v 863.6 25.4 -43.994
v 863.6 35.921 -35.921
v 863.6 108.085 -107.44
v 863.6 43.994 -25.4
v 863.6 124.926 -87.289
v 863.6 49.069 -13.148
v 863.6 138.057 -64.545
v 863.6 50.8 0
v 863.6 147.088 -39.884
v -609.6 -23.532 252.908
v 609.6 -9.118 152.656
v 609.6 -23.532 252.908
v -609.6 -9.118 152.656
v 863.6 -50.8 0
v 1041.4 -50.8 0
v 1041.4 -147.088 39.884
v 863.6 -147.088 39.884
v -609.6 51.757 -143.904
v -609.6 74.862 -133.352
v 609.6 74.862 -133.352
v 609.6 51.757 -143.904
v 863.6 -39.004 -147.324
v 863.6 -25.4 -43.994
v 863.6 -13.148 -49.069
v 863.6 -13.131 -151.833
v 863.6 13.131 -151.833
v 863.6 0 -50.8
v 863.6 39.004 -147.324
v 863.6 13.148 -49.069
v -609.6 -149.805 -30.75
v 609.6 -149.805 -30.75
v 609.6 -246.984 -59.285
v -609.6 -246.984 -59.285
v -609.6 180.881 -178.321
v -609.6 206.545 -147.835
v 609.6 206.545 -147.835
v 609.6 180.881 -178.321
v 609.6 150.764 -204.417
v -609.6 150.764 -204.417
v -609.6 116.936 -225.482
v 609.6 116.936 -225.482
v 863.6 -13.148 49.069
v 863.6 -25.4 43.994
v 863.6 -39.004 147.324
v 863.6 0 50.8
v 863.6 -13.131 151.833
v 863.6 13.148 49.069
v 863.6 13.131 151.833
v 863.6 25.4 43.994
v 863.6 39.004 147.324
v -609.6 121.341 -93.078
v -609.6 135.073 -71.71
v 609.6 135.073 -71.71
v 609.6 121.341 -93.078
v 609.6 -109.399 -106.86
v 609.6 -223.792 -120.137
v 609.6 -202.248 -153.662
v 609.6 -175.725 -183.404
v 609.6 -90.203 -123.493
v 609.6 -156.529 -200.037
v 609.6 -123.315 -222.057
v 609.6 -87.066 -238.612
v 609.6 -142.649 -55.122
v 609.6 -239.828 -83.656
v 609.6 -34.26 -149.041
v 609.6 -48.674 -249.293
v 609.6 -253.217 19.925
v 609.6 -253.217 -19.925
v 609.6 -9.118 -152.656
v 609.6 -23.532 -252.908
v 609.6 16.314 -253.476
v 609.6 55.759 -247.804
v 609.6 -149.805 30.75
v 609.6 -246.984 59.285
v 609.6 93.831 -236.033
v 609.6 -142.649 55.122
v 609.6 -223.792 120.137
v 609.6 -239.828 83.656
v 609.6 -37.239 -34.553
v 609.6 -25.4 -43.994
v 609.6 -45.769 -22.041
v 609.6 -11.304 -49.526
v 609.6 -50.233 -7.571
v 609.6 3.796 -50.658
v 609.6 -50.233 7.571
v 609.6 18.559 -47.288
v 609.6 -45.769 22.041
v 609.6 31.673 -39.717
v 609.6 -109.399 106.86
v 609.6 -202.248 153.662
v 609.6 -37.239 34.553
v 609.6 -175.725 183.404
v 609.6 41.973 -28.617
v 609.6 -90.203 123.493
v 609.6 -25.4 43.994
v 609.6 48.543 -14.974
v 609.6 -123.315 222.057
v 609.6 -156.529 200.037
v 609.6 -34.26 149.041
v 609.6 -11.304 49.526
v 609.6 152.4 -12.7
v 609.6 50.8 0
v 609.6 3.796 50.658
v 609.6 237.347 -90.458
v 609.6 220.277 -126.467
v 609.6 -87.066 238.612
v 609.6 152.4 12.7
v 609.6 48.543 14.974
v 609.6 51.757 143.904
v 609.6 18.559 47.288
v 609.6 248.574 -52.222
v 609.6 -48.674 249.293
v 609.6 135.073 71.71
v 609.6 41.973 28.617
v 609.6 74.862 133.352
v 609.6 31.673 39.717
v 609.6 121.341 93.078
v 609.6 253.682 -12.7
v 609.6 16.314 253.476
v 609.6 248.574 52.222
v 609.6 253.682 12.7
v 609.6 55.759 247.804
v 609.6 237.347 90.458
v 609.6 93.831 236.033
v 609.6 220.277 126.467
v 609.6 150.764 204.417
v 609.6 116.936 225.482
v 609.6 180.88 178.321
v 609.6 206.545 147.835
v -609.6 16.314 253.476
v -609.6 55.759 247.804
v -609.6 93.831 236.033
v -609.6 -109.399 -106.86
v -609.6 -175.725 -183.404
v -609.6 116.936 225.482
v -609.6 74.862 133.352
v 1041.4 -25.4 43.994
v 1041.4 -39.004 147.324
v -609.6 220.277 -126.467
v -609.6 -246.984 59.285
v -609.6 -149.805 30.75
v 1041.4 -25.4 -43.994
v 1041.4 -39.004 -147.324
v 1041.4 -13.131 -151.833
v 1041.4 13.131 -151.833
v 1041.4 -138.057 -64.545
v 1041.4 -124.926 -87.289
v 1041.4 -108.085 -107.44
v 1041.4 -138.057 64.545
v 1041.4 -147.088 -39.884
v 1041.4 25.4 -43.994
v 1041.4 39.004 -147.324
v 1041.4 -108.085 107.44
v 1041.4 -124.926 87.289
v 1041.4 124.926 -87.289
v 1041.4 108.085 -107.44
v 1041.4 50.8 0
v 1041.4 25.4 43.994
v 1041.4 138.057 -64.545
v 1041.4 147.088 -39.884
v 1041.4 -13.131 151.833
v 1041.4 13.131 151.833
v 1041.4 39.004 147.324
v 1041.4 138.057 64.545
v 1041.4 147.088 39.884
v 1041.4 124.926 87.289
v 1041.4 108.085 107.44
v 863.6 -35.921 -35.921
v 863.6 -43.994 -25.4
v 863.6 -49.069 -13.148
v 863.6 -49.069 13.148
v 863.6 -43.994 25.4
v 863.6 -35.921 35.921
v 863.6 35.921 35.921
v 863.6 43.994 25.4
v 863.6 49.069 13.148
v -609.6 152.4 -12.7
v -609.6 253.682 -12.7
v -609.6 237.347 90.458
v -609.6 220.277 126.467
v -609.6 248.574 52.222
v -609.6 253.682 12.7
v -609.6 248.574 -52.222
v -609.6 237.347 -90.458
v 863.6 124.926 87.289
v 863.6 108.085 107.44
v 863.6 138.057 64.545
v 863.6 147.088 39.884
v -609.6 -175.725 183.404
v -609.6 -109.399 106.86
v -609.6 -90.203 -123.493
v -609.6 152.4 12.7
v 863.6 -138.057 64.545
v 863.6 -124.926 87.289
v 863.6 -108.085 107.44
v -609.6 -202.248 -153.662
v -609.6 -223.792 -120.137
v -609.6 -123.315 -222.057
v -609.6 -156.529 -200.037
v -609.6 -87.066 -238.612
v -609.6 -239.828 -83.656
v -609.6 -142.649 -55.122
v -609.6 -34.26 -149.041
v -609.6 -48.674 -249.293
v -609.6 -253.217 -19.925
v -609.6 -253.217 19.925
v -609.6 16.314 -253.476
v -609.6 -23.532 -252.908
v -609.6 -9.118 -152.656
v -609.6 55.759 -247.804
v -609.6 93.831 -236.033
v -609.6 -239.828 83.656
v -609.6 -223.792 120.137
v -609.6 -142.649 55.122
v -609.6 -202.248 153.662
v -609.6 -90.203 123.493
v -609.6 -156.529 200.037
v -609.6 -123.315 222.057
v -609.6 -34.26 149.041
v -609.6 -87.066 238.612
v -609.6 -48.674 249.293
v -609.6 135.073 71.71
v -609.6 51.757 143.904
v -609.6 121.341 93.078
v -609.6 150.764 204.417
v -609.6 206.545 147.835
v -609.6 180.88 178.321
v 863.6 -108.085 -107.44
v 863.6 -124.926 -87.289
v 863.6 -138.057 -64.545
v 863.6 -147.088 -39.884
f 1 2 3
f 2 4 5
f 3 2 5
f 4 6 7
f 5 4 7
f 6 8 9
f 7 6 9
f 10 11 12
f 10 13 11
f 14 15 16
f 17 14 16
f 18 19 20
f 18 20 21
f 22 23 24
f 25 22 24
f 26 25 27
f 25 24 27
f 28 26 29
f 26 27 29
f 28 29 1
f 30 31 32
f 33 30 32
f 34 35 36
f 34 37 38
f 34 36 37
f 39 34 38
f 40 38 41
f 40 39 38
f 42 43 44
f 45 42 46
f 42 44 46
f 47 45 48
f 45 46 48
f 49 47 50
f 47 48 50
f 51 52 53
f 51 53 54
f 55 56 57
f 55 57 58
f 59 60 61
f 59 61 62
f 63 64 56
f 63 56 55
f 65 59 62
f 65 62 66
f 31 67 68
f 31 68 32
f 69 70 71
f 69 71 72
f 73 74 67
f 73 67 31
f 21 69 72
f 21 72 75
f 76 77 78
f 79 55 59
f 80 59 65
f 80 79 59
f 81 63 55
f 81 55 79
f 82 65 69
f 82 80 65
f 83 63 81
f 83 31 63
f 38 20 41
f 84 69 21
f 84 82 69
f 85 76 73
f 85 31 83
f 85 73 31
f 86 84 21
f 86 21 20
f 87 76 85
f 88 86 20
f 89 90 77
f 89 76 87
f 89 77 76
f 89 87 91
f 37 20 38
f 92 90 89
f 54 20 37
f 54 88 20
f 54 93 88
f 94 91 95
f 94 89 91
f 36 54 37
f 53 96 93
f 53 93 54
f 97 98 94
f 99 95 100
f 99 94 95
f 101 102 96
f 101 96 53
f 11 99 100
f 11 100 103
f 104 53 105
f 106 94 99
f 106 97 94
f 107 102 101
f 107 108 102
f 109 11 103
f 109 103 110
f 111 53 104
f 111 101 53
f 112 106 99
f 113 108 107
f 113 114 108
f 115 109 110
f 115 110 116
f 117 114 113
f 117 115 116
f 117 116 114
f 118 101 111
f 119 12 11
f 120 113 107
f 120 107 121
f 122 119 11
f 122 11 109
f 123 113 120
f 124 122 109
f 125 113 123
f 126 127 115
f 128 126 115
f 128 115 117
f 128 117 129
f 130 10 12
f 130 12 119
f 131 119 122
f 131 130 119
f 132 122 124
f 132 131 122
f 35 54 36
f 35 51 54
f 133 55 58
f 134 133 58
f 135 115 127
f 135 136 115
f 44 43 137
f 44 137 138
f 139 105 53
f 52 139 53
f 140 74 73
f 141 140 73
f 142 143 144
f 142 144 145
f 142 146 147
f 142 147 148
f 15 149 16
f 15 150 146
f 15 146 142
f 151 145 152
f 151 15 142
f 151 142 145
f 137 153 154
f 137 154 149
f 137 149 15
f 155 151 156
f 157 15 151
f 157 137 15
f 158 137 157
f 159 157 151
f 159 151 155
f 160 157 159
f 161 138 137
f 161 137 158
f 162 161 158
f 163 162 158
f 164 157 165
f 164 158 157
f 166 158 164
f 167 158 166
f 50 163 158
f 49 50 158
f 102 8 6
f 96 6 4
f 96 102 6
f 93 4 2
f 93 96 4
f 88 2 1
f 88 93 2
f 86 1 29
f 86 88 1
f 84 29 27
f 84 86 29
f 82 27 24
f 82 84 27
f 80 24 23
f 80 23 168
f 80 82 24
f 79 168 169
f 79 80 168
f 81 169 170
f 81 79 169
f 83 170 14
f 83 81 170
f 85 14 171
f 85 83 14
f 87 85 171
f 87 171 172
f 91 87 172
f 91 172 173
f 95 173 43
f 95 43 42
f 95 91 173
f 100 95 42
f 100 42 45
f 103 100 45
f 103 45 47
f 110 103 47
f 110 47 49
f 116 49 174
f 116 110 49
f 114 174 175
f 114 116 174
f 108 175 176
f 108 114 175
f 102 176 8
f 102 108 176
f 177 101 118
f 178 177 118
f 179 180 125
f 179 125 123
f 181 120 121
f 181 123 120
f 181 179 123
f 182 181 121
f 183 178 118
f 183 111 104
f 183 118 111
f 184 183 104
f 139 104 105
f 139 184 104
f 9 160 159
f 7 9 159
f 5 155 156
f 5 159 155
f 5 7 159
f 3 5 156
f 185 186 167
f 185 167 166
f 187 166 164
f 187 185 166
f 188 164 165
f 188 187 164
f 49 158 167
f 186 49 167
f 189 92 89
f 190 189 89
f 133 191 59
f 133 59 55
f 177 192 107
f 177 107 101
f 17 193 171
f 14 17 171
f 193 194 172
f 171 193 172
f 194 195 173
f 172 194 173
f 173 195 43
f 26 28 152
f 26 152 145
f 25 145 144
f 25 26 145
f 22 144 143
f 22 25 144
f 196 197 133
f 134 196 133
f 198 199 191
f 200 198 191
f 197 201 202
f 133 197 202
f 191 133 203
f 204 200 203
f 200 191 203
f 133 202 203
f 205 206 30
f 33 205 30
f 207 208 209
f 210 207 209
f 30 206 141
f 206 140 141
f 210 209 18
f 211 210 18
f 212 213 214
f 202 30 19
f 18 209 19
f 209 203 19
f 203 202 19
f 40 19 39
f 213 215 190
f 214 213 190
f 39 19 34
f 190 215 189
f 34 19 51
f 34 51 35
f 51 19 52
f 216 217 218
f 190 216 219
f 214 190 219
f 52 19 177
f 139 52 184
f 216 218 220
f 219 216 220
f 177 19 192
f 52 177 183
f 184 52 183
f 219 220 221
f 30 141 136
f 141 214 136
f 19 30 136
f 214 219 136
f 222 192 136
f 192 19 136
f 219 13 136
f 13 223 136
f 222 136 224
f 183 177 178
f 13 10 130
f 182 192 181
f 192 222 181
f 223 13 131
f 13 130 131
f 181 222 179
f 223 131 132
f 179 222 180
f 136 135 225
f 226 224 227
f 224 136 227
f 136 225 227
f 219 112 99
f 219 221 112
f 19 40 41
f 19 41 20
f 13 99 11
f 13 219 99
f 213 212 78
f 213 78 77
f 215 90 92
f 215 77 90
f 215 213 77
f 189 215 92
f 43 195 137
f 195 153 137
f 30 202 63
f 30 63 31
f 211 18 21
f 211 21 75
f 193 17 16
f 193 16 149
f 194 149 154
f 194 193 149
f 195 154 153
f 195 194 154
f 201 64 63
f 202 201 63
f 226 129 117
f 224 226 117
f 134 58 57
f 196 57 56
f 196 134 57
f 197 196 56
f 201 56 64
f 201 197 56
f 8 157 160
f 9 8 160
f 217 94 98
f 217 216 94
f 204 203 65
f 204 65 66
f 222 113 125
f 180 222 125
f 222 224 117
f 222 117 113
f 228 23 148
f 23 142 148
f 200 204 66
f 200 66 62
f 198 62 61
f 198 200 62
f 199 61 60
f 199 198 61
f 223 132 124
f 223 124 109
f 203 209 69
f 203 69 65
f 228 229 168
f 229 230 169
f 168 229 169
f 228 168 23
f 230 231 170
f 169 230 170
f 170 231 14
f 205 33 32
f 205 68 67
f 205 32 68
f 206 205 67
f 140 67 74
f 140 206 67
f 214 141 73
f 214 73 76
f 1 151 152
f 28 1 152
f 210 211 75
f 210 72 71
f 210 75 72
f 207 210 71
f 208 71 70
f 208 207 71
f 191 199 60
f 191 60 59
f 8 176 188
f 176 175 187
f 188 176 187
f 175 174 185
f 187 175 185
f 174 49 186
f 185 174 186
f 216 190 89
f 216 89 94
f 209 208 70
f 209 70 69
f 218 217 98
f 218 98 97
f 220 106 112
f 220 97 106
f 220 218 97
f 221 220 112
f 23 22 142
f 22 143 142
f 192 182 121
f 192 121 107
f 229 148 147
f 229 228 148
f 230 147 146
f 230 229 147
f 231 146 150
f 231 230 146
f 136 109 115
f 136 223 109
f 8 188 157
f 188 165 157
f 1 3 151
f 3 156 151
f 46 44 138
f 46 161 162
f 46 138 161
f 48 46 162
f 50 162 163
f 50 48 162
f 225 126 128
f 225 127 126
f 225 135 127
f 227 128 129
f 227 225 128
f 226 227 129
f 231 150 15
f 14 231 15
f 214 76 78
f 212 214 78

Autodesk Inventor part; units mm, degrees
ref_plane "YZ Plane" through (0, 0, 0) normal (1, 0, 0) x (0, 1, 0)
ref_plane "XZ Plane" through (0, 0, 0) normal (0, 1, 0) x (-1, 0, 0)
ref_plane "XY Plane" through (0, 0, 0) normal (0, 0, 1) x (1, 0, 0)
sketch "Sketch1" plane through (0, 0, 0) normal (1, 0, 0) x (0, 1, 0)
  line L0 (253.6823, 12.7) -> (152.4, 12.7)
  line L1 (152.4, 12.7) -> (152.4, -12.7)
  line L2 (152.4, -12.7) -> (253.6823, -12.7)
  line L3 (228.6, 0) -> (152.4, 0) construction
  line L4 (206.545, 147.8349) -> (121.3409, 93.0776)
  line L5 (121.3409, 93.0776) -> (135.0732, 71.7097)
  line L6 (135.0732, 71.7097) -> (220.2773, 126.4671)
  line L7 (93.8311, 236.0333) -> (51.7569, 143.9037)
  line L8 (51.7569, 143.9037) -> (74.8616, 133.3521)
  line L9 (74.8616, 133.3521) -> (116.9358, 225.4818)
  line L10 (-48.6735, 249.2928) -> (-34.2595, 149.0414)
  line L11 (-34.2595, 149.0414) -> (-9.118, 152.6562)
  line L12 (-9.118, 152.6562) -> (-23.532, 252.9076)
  line L13 (-175.7246, 183.4036) -> (-109.3988, 106.8595)
  line L14 (-109.3988, 106.8595) -> (-90.2028, 123.493)
  line L15 (-90.2028, 123.493) -> (-156.5286, 200.037)
  line L16 (-246.9844, 59.285) -> (-149.8047, 30.7505)
  line L17 (-149.8047, 30.7505) -> (-142.6487, 55.1216)
  line L18 (-142.6487, 55.1216) -> (-239.8284, 83.6561)
  line L19 (-239.8284, -83.6561) -> (-142.6487, -55.1216)
  line L20 (-142.6487, -55.1216) -> (-149.8047, -30.7505)
  line L21 (-149.8047, -30.7505) -> (-246.9844, -59.285)
  line L22 (-156.5286, -200.037) -> (-90.2028, -123.493)
  line L23 (-90.2028, -123.493) -> (-109.3988, -106.8595)
  line L24 (-109.3988, -106.8595) -> (-175.7246, -183.4036)
  line L25 (-23.532, -252.9076) -> (-9.118, -152.6562)
  line L26 (-9.118, -152.6562) -> (-34.2595, -149.0414)
  line L27 (-34.2595, -149.0414) -> (-48.6735, -249.2928)
  line L28 (116.9358, -225.4818) -> (74.8616, -133.3521)
  line L29 (74.8616, -133.3521) -> (51.7569, -143.9037)
  line L30 (51.7569, -143.9037) -> (93.8311, -236.0333)
  line L31 (220.2773, -126.4671) -> (135.0732, -71.7097)
  line L32 (135.0732, -71.7097) -> (121.3409, -93.0776)
  line L33 (121.3409, -93.0776) -> (206.545, -147.8349)
  arc A0 (253.6823, 12.7) -> (220.2773, 126.4671) centre (0, 0) ccw
  arc A1 (220.2773, -126.4671) -> (253.6823, -12.7) centre (0, 0) ccw
  arc A2 (116.9358, -225.4818) -> (206.545, -147.8349) centre (0, 0) ccw
  arc A3 (-23.532, -252.9076) -> (93.8311, -236.0333) centre (0, 0) ccw
  arc A4 (-156.5286, -200.037) -> (-48.6735, -249.2928) centre (0, 0) ccw
  arc A5 (-239.8284, -83.6561) -> (-175.7246, -183.4036) centre (0, 0) ccw
  arc A6 (-246.9844, 59.285) -> (-246.9844, -59.285) centre (0, 0) ccw
  arc A7 (-175.7246, 183.4036) -> (-239.8284, 83.6561) centre (0, 0) ccw
  arc A8 (-48.6735, 249.2928) -> (-156.5286, 200.037) centre (0, 0) ccw
  arc A9 (206.545, 147.8349) -> (116.9358, 225.4818) centre (0, 0) ccw
  arc A10 (93.8311, 236.0333) -> (-23.532, 252.9076) centre (0, 0) ccw
  point P0 (128.207, 82.3937)
  point P1 (63.3092, 138.6279)
  point P2 (-21.6888, 150.8488)
  point P3 (-99.8008, 115.1762)
  point P4 (-146.2267, 42.936)
  point P5 (-146.2267, -42.936)
  point P6 (-99.8008, -115.1762)
  point P7 (-21.6888, -150.8488)
  point P8 (63.3092, -138.6279)
  point P9 (128.207, -82.3937)
  dimension "d4" = 254
  dimension "d5" = 152.4
  dimension "d6" = 25.4
extrude "Extrusion1" add sketch "Sketch1" along normal mid plane 1219.2
sketch "Sketch2" plane through (0, 0, 0) normal (0, 0, 1) x (1, 0, 0)
  line L0 (609.6, 0) -> (1041.4, 0)
  line L1 (1041.4, 0) -> (1041.4, 152.4)
  line L2 (1041.4, 152.4) -> (863.6, 152.4)
  line L3 (863.6, 152.4) -> (863.6, 50.8)
  line L4 (863.6, 50.8) -> (609.6, 50.8)
  line L5 (609.6, -23.532) -> (609.6, 93.8311) projected
  point P0 (0, 0)
  dimension "d9" = 101.6
  dimension "d10" = 177.8
  dimension "d11" = 304.8
  dimension "d12" = 254
revolve "Revolution1" add sketch "Sketch2" angle 360 about axis through (609.6, 0, 0) along (1, 0, 0)
sketch "Sketch3" plane through (1041.4, 0, 0) normal (1, 0, 0) x (0, 0, -1)
  circle A0 centre (0, 0) radius 152.4 construction
  circle A1 centre (0, 0) radius 152.4 construction
  line L0 (-39.884, 147.0885) -> (0, 50.8)
  line L1 (0, 50.8) -> (39.884, 147.0885)
  line L2 (0, 0) -> (0, 152.4) construction
  line L3 (-43.9941, 25.4) -> (-107.4404, 108.0848)
  line L4 (-147.3244, 39.0037) -> (-43.9941, 25.4)
  line L5 (-43.9941, -25.4) -> (-147.3244, -39.0037)
  line L6 (-107.4404, -108.0848) -> (-43.9941, -25.4)
  line L7 (0, -50.8) -> (-39.884, -147.0885)
  line L8 (39.884, -147.0885) -> (0, -50.8)
  line L9 (43.9941, -25.4) -> (107.4404, -108.0848)
  line L10 (147.3244, -39.0037) -> (43.9941, -25.4)
  line L11 (43.9941, 25.4) -> (147.3244, 39.0037)
  line L12 (107.4404, 108.0848) -> (43.9941, 25.4)
  arc A2 (39.884, 147.0885) -> (-39.884, 147.0885) centre (0, 0) ccw
  arc A3 (147.3244, 39.0037) -> (107.4404, 108.0848) centre (0, 0) ccw
  arc A4 (107.4404, -108.0848) -> (147.3244, -39.0037) centre (0, 0) ccw
  arc A5 (-39.884, -147.0885) -> (39.884, -147.0885) centre (0, 0) ccw
  arc A6 (-107.4404, 108.0848) -> (-147.3244, 39.0037) centre (0, 0) ccw
  arc A7 (-147.3244, -39.0037) -> (-107.4404, -108.0848) centre (0, 0) ccw
  dimension "d14" = 50.8
  dimension "d15" = 45
  dimension "d18" = 360
extrude "Extrusion2" cut sketch "Sketch3" against normal up to surface (177.8 mm away)
properties part number "Hydraulic ShaftCJE" material "Steel, High Strength, Low Alloy"
